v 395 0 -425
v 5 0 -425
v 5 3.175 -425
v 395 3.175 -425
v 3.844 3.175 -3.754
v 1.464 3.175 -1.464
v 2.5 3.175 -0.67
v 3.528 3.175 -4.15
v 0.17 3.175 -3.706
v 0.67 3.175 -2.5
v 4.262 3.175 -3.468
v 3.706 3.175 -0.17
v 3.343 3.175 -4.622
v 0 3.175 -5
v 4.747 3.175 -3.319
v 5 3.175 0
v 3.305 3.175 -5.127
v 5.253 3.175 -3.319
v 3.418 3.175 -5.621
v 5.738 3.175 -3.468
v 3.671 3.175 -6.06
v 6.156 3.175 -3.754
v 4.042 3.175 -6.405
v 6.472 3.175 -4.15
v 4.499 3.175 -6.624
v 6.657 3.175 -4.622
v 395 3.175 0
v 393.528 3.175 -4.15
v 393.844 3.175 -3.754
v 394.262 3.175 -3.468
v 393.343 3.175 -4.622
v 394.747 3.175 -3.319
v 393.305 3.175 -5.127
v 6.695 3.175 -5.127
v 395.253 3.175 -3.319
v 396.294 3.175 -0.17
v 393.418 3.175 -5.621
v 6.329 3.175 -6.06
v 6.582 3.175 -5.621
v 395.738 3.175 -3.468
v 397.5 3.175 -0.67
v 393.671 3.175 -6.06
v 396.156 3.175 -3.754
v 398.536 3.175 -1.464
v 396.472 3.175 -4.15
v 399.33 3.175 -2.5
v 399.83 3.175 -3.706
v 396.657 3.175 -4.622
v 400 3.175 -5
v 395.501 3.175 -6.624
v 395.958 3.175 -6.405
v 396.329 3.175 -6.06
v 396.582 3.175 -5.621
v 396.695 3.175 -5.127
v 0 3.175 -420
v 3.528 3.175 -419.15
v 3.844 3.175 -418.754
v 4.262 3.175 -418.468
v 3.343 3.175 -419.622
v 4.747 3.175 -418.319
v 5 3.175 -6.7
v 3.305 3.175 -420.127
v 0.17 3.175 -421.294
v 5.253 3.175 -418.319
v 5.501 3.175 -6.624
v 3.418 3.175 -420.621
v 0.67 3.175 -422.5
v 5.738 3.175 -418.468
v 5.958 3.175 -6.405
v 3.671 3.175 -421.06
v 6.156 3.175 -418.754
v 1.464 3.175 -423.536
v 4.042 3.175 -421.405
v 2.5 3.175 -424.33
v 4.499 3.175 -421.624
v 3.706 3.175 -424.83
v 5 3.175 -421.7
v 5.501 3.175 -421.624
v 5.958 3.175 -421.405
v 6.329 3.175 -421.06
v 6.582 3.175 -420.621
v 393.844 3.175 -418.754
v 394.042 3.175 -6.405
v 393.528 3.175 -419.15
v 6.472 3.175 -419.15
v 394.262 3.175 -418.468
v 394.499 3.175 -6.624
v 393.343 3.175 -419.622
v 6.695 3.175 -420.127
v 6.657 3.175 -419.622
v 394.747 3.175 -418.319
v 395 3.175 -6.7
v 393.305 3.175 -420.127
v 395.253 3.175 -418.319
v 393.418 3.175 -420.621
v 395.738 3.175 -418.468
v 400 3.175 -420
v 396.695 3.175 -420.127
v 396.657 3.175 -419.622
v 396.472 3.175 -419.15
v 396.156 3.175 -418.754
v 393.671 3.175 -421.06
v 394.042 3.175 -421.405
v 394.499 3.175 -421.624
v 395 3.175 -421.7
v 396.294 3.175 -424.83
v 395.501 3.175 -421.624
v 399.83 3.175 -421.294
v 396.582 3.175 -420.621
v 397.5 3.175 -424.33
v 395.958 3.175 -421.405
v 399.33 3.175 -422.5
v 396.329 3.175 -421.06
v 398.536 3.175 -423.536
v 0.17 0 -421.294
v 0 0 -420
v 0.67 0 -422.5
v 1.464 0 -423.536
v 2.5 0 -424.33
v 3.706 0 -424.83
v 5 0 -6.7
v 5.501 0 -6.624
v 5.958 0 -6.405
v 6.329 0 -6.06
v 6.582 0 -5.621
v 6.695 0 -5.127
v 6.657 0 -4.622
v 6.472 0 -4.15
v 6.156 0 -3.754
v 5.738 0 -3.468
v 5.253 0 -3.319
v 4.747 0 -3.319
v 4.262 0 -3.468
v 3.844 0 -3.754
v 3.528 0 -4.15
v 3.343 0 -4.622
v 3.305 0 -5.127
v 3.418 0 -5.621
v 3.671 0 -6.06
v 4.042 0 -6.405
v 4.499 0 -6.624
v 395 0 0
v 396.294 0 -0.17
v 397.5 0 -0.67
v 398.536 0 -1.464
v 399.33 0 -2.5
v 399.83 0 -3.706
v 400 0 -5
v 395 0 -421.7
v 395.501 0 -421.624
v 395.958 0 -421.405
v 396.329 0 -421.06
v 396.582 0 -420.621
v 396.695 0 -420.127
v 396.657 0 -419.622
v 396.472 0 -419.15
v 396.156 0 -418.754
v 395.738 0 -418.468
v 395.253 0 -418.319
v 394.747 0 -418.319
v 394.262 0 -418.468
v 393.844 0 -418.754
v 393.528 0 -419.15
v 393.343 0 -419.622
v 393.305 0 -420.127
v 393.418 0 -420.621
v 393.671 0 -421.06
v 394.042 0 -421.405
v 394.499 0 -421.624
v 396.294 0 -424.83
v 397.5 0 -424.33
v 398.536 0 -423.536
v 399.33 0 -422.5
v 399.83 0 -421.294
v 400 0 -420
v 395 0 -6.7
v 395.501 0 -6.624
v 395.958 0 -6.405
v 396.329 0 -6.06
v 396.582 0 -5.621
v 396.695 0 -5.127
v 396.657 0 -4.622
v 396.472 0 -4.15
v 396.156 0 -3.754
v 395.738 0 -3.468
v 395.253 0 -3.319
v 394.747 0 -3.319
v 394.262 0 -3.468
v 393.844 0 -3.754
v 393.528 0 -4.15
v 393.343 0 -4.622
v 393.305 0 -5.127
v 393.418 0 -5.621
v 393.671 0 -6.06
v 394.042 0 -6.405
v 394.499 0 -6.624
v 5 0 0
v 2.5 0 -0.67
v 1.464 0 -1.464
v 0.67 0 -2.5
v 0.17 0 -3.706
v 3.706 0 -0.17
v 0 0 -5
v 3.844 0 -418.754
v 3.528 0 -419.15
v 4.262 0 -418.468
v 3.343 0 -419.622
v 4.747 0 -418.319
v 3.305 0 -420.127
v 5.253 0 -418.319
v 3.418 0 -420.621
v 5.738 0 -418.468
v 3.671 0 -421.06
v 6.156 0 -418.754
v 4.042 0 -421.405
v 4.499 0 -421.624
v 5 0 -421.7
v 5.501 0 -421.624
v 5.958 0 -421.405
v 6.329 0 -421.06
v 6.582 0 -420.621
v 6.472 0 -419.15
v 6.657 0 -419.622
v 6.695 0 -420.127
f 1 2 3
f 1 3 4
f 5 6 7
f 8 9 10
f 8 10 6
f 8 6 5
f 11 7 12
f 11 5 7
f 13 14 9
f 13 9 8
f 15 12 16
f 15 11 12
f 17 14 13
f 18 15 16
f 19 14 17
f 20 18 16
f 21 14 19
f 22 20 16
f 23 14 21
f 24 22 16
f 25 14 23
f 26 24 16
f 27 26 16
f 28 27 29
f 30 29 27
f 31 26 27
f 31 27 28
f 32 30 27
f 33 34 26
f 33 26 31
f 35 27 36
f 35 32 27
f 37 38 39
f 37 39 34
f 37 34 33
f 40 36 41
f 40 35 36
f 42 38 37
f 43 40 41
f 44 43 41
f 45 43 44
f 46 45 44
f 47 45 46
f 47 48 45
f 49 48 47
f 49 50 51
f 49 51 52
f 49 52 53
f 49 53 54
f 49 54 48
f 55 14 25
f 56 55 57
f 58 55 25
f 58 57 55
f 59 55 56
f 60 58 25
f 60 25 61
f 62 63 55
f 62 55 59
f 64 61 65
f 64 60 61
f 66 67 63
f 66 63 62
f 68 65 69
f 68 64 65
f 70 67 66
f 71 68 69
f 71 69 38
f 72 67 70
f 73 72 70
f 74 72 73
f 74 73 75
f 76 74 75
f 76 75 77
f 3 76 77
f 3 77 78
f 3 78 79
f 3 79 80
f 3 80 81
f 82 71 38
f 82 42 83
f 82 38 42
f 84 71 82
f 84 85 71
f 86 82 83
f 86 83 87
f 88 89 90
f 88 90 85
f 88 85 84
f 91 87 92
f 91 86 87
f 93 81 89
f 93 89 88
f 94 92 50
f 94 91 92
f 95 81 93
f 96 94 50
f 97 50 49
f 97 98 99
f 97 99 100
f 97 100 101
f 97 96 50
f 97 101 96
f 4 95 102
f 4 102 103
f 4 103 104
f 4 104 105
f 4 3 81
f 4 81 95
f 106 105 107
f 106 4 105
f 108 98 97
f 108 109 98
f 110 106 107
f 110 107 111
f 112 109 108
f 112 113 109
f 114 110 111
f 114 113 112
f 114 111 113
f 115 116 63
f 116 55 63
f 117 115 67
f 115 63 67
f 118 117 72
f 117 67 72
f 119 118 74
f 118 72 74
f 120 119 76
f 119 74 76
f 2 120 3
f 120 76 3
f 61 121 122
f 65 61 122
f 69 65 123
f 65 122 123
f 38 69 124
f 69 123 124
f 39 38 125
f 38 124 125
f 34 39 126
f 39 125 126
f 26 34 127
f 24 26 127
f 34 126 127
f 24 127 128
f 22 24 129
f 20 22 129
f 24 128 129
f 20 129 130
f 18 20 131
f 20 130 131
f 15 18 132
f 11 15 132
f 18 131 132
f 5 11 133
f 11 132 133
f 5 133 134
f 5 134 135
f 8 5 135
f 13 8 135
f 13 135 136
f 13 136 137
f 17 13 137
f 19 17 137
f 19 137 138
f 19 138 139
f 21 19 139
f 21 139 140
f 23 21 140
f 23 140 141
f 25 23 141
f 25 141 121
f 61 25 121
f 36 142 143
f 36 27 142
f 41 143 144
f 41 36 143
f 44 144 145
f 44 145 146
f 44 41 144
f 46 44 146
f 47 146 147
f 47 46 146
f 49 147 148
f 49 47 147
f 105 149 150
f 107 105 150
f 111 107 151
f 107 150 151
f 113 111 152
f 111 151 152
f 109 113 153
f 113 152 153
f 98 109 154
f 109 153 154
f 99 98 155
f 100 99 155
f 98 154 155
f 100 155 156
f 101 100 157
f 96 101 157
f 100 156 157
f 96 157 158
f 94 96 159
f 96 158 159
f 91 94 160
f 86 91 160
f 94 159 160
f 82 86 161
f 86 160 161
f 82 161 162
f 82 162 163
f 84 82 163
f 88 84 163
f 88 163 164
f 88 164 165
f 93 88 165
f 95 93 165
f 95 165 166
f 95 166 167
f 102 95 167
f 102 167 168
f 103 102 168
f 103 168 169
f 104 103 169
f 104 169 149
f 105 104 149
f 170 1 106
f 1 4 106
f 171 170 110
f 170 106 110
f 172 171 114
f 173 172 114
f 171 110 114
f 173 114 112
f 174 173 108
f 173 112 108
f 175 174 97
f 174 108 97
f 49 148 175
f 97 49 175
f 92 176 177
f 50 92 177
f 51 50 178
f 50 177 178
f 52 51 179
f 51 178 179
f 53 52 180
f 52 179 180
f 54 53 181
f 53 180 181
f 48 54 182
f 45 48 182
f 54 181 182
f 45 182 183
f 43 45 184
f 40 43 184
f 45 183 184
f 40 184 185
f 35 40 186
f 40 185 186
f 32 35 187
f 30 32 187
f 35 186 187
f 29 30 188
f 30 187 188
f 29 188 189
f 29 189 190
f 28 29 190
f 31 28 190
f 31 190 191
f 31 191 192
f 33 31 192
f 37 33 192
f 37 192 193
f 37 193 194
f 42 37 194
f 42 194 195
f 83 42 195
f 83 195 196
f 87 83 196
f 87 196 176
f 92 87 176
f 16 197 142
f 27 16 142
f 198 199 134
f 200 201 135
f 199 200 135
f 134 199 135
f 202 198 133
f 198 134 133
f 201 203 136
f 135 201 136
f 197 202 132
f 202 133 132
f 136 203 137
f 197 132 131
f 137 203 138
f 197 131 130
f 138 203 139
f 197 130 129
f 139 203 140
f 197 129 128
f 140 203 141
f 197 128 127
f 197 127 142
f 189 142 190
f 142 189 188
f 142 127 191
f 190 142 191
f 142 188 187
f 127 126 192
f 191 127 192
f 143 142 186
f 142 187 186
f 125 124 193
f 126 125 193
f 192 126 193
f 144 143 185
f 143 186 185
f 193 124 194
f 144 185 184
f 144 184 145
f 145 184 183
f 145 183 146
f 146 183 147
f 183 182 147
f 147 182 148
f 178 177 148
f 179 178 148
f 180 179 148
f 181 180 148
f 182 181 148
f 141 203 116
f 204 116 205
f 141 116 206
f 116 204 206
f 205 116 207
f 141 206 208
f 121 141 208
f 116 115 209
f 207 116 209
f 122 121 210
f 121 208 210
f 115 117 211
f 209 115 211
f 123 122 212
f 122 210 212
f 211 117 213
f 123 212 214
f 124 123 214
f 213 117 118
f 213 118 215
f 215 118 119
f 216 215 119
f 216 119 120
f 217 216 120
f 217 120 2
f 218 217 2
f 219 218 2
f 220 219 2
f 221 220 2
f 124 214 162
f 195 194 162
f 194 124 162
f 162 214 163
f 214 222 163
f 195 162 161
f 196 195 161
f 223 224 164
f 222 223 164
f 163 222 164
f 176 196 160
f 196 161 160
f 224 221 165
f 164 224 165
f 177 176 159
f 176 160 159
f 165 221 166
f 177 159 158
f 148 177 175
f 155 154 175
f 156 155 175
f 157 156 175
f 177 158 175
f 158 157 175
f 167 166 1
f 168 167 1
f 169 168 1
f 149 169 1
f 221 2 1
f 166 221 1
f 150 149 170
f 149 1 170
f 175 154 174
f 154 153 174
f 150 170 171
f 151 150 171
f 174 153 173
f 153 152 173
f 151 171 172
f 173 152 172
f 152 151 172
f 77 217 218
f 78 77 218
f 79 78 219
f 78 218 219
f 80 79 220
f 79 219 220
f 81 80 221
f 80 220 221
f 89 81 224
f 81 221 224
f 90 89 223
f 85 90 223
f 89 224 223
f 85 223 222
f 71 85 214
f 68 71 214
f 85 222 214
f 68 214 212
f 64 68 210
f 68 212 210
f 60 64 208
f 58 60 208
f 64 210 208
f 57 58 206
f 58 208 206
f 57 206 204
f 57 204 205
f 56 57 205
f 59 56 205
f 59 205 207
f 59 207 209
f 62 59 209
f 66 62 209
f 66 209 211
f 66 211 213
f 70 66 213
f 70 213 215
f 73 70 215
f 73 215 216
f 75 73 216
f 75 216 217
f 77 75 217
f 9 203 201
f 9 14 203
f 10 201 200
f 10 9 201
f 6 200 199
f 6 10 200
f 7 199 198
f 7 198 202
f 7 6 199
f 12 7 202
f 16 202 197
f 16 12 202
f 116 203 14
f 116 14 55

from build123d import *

# Parameters (mm, degrees)
SKETCH2_W            = 400
SKETCH2_H            = 425
BOSS_EXTRUDE1_DEPTH  = 3.175
M3_CLEARANCE_HOLE1_D = 3.4
FILLET1_R            = 5


with BuildPart() as part:
    # Sketch2 → Boss-Extrude1 (new body)
    with BuildSketch(Plane(origin=(0, 0, 0), x_dir=(1, 0, 0), z_dir=(0, 1, 0))):
        with Locations((200, 212.5)):
            Rectangle(SKETCH2_W, SKETCH2_H)
    extrude(amount=BOSS_EXTRUDE1_DEPTH)

    # M3 Clearance Hole1 (through all)
    with Locations(Plane(origin=(5, 3.175, -420), x_dir=(0, 0, 1), z_dir=(0, 1, 0))):
        with Locations((0, 0), (0, 390), (415, 0), (415, 390)):
            Hole(M3_CLEARANCE_HOLE1_D / 2)

    # Fillet1
    fillet1_edges = [part.edges().sort_by_distance(p)[0] for p in [
        (0, 1.5875, -425),
        (400, 1.5875, -425),
        (400, 1.5875, 0),
        (0, 1.5875, 0),
    ]]
    fillet(fillet1_edges, radius=FILLET1_R)


solid = part.part
